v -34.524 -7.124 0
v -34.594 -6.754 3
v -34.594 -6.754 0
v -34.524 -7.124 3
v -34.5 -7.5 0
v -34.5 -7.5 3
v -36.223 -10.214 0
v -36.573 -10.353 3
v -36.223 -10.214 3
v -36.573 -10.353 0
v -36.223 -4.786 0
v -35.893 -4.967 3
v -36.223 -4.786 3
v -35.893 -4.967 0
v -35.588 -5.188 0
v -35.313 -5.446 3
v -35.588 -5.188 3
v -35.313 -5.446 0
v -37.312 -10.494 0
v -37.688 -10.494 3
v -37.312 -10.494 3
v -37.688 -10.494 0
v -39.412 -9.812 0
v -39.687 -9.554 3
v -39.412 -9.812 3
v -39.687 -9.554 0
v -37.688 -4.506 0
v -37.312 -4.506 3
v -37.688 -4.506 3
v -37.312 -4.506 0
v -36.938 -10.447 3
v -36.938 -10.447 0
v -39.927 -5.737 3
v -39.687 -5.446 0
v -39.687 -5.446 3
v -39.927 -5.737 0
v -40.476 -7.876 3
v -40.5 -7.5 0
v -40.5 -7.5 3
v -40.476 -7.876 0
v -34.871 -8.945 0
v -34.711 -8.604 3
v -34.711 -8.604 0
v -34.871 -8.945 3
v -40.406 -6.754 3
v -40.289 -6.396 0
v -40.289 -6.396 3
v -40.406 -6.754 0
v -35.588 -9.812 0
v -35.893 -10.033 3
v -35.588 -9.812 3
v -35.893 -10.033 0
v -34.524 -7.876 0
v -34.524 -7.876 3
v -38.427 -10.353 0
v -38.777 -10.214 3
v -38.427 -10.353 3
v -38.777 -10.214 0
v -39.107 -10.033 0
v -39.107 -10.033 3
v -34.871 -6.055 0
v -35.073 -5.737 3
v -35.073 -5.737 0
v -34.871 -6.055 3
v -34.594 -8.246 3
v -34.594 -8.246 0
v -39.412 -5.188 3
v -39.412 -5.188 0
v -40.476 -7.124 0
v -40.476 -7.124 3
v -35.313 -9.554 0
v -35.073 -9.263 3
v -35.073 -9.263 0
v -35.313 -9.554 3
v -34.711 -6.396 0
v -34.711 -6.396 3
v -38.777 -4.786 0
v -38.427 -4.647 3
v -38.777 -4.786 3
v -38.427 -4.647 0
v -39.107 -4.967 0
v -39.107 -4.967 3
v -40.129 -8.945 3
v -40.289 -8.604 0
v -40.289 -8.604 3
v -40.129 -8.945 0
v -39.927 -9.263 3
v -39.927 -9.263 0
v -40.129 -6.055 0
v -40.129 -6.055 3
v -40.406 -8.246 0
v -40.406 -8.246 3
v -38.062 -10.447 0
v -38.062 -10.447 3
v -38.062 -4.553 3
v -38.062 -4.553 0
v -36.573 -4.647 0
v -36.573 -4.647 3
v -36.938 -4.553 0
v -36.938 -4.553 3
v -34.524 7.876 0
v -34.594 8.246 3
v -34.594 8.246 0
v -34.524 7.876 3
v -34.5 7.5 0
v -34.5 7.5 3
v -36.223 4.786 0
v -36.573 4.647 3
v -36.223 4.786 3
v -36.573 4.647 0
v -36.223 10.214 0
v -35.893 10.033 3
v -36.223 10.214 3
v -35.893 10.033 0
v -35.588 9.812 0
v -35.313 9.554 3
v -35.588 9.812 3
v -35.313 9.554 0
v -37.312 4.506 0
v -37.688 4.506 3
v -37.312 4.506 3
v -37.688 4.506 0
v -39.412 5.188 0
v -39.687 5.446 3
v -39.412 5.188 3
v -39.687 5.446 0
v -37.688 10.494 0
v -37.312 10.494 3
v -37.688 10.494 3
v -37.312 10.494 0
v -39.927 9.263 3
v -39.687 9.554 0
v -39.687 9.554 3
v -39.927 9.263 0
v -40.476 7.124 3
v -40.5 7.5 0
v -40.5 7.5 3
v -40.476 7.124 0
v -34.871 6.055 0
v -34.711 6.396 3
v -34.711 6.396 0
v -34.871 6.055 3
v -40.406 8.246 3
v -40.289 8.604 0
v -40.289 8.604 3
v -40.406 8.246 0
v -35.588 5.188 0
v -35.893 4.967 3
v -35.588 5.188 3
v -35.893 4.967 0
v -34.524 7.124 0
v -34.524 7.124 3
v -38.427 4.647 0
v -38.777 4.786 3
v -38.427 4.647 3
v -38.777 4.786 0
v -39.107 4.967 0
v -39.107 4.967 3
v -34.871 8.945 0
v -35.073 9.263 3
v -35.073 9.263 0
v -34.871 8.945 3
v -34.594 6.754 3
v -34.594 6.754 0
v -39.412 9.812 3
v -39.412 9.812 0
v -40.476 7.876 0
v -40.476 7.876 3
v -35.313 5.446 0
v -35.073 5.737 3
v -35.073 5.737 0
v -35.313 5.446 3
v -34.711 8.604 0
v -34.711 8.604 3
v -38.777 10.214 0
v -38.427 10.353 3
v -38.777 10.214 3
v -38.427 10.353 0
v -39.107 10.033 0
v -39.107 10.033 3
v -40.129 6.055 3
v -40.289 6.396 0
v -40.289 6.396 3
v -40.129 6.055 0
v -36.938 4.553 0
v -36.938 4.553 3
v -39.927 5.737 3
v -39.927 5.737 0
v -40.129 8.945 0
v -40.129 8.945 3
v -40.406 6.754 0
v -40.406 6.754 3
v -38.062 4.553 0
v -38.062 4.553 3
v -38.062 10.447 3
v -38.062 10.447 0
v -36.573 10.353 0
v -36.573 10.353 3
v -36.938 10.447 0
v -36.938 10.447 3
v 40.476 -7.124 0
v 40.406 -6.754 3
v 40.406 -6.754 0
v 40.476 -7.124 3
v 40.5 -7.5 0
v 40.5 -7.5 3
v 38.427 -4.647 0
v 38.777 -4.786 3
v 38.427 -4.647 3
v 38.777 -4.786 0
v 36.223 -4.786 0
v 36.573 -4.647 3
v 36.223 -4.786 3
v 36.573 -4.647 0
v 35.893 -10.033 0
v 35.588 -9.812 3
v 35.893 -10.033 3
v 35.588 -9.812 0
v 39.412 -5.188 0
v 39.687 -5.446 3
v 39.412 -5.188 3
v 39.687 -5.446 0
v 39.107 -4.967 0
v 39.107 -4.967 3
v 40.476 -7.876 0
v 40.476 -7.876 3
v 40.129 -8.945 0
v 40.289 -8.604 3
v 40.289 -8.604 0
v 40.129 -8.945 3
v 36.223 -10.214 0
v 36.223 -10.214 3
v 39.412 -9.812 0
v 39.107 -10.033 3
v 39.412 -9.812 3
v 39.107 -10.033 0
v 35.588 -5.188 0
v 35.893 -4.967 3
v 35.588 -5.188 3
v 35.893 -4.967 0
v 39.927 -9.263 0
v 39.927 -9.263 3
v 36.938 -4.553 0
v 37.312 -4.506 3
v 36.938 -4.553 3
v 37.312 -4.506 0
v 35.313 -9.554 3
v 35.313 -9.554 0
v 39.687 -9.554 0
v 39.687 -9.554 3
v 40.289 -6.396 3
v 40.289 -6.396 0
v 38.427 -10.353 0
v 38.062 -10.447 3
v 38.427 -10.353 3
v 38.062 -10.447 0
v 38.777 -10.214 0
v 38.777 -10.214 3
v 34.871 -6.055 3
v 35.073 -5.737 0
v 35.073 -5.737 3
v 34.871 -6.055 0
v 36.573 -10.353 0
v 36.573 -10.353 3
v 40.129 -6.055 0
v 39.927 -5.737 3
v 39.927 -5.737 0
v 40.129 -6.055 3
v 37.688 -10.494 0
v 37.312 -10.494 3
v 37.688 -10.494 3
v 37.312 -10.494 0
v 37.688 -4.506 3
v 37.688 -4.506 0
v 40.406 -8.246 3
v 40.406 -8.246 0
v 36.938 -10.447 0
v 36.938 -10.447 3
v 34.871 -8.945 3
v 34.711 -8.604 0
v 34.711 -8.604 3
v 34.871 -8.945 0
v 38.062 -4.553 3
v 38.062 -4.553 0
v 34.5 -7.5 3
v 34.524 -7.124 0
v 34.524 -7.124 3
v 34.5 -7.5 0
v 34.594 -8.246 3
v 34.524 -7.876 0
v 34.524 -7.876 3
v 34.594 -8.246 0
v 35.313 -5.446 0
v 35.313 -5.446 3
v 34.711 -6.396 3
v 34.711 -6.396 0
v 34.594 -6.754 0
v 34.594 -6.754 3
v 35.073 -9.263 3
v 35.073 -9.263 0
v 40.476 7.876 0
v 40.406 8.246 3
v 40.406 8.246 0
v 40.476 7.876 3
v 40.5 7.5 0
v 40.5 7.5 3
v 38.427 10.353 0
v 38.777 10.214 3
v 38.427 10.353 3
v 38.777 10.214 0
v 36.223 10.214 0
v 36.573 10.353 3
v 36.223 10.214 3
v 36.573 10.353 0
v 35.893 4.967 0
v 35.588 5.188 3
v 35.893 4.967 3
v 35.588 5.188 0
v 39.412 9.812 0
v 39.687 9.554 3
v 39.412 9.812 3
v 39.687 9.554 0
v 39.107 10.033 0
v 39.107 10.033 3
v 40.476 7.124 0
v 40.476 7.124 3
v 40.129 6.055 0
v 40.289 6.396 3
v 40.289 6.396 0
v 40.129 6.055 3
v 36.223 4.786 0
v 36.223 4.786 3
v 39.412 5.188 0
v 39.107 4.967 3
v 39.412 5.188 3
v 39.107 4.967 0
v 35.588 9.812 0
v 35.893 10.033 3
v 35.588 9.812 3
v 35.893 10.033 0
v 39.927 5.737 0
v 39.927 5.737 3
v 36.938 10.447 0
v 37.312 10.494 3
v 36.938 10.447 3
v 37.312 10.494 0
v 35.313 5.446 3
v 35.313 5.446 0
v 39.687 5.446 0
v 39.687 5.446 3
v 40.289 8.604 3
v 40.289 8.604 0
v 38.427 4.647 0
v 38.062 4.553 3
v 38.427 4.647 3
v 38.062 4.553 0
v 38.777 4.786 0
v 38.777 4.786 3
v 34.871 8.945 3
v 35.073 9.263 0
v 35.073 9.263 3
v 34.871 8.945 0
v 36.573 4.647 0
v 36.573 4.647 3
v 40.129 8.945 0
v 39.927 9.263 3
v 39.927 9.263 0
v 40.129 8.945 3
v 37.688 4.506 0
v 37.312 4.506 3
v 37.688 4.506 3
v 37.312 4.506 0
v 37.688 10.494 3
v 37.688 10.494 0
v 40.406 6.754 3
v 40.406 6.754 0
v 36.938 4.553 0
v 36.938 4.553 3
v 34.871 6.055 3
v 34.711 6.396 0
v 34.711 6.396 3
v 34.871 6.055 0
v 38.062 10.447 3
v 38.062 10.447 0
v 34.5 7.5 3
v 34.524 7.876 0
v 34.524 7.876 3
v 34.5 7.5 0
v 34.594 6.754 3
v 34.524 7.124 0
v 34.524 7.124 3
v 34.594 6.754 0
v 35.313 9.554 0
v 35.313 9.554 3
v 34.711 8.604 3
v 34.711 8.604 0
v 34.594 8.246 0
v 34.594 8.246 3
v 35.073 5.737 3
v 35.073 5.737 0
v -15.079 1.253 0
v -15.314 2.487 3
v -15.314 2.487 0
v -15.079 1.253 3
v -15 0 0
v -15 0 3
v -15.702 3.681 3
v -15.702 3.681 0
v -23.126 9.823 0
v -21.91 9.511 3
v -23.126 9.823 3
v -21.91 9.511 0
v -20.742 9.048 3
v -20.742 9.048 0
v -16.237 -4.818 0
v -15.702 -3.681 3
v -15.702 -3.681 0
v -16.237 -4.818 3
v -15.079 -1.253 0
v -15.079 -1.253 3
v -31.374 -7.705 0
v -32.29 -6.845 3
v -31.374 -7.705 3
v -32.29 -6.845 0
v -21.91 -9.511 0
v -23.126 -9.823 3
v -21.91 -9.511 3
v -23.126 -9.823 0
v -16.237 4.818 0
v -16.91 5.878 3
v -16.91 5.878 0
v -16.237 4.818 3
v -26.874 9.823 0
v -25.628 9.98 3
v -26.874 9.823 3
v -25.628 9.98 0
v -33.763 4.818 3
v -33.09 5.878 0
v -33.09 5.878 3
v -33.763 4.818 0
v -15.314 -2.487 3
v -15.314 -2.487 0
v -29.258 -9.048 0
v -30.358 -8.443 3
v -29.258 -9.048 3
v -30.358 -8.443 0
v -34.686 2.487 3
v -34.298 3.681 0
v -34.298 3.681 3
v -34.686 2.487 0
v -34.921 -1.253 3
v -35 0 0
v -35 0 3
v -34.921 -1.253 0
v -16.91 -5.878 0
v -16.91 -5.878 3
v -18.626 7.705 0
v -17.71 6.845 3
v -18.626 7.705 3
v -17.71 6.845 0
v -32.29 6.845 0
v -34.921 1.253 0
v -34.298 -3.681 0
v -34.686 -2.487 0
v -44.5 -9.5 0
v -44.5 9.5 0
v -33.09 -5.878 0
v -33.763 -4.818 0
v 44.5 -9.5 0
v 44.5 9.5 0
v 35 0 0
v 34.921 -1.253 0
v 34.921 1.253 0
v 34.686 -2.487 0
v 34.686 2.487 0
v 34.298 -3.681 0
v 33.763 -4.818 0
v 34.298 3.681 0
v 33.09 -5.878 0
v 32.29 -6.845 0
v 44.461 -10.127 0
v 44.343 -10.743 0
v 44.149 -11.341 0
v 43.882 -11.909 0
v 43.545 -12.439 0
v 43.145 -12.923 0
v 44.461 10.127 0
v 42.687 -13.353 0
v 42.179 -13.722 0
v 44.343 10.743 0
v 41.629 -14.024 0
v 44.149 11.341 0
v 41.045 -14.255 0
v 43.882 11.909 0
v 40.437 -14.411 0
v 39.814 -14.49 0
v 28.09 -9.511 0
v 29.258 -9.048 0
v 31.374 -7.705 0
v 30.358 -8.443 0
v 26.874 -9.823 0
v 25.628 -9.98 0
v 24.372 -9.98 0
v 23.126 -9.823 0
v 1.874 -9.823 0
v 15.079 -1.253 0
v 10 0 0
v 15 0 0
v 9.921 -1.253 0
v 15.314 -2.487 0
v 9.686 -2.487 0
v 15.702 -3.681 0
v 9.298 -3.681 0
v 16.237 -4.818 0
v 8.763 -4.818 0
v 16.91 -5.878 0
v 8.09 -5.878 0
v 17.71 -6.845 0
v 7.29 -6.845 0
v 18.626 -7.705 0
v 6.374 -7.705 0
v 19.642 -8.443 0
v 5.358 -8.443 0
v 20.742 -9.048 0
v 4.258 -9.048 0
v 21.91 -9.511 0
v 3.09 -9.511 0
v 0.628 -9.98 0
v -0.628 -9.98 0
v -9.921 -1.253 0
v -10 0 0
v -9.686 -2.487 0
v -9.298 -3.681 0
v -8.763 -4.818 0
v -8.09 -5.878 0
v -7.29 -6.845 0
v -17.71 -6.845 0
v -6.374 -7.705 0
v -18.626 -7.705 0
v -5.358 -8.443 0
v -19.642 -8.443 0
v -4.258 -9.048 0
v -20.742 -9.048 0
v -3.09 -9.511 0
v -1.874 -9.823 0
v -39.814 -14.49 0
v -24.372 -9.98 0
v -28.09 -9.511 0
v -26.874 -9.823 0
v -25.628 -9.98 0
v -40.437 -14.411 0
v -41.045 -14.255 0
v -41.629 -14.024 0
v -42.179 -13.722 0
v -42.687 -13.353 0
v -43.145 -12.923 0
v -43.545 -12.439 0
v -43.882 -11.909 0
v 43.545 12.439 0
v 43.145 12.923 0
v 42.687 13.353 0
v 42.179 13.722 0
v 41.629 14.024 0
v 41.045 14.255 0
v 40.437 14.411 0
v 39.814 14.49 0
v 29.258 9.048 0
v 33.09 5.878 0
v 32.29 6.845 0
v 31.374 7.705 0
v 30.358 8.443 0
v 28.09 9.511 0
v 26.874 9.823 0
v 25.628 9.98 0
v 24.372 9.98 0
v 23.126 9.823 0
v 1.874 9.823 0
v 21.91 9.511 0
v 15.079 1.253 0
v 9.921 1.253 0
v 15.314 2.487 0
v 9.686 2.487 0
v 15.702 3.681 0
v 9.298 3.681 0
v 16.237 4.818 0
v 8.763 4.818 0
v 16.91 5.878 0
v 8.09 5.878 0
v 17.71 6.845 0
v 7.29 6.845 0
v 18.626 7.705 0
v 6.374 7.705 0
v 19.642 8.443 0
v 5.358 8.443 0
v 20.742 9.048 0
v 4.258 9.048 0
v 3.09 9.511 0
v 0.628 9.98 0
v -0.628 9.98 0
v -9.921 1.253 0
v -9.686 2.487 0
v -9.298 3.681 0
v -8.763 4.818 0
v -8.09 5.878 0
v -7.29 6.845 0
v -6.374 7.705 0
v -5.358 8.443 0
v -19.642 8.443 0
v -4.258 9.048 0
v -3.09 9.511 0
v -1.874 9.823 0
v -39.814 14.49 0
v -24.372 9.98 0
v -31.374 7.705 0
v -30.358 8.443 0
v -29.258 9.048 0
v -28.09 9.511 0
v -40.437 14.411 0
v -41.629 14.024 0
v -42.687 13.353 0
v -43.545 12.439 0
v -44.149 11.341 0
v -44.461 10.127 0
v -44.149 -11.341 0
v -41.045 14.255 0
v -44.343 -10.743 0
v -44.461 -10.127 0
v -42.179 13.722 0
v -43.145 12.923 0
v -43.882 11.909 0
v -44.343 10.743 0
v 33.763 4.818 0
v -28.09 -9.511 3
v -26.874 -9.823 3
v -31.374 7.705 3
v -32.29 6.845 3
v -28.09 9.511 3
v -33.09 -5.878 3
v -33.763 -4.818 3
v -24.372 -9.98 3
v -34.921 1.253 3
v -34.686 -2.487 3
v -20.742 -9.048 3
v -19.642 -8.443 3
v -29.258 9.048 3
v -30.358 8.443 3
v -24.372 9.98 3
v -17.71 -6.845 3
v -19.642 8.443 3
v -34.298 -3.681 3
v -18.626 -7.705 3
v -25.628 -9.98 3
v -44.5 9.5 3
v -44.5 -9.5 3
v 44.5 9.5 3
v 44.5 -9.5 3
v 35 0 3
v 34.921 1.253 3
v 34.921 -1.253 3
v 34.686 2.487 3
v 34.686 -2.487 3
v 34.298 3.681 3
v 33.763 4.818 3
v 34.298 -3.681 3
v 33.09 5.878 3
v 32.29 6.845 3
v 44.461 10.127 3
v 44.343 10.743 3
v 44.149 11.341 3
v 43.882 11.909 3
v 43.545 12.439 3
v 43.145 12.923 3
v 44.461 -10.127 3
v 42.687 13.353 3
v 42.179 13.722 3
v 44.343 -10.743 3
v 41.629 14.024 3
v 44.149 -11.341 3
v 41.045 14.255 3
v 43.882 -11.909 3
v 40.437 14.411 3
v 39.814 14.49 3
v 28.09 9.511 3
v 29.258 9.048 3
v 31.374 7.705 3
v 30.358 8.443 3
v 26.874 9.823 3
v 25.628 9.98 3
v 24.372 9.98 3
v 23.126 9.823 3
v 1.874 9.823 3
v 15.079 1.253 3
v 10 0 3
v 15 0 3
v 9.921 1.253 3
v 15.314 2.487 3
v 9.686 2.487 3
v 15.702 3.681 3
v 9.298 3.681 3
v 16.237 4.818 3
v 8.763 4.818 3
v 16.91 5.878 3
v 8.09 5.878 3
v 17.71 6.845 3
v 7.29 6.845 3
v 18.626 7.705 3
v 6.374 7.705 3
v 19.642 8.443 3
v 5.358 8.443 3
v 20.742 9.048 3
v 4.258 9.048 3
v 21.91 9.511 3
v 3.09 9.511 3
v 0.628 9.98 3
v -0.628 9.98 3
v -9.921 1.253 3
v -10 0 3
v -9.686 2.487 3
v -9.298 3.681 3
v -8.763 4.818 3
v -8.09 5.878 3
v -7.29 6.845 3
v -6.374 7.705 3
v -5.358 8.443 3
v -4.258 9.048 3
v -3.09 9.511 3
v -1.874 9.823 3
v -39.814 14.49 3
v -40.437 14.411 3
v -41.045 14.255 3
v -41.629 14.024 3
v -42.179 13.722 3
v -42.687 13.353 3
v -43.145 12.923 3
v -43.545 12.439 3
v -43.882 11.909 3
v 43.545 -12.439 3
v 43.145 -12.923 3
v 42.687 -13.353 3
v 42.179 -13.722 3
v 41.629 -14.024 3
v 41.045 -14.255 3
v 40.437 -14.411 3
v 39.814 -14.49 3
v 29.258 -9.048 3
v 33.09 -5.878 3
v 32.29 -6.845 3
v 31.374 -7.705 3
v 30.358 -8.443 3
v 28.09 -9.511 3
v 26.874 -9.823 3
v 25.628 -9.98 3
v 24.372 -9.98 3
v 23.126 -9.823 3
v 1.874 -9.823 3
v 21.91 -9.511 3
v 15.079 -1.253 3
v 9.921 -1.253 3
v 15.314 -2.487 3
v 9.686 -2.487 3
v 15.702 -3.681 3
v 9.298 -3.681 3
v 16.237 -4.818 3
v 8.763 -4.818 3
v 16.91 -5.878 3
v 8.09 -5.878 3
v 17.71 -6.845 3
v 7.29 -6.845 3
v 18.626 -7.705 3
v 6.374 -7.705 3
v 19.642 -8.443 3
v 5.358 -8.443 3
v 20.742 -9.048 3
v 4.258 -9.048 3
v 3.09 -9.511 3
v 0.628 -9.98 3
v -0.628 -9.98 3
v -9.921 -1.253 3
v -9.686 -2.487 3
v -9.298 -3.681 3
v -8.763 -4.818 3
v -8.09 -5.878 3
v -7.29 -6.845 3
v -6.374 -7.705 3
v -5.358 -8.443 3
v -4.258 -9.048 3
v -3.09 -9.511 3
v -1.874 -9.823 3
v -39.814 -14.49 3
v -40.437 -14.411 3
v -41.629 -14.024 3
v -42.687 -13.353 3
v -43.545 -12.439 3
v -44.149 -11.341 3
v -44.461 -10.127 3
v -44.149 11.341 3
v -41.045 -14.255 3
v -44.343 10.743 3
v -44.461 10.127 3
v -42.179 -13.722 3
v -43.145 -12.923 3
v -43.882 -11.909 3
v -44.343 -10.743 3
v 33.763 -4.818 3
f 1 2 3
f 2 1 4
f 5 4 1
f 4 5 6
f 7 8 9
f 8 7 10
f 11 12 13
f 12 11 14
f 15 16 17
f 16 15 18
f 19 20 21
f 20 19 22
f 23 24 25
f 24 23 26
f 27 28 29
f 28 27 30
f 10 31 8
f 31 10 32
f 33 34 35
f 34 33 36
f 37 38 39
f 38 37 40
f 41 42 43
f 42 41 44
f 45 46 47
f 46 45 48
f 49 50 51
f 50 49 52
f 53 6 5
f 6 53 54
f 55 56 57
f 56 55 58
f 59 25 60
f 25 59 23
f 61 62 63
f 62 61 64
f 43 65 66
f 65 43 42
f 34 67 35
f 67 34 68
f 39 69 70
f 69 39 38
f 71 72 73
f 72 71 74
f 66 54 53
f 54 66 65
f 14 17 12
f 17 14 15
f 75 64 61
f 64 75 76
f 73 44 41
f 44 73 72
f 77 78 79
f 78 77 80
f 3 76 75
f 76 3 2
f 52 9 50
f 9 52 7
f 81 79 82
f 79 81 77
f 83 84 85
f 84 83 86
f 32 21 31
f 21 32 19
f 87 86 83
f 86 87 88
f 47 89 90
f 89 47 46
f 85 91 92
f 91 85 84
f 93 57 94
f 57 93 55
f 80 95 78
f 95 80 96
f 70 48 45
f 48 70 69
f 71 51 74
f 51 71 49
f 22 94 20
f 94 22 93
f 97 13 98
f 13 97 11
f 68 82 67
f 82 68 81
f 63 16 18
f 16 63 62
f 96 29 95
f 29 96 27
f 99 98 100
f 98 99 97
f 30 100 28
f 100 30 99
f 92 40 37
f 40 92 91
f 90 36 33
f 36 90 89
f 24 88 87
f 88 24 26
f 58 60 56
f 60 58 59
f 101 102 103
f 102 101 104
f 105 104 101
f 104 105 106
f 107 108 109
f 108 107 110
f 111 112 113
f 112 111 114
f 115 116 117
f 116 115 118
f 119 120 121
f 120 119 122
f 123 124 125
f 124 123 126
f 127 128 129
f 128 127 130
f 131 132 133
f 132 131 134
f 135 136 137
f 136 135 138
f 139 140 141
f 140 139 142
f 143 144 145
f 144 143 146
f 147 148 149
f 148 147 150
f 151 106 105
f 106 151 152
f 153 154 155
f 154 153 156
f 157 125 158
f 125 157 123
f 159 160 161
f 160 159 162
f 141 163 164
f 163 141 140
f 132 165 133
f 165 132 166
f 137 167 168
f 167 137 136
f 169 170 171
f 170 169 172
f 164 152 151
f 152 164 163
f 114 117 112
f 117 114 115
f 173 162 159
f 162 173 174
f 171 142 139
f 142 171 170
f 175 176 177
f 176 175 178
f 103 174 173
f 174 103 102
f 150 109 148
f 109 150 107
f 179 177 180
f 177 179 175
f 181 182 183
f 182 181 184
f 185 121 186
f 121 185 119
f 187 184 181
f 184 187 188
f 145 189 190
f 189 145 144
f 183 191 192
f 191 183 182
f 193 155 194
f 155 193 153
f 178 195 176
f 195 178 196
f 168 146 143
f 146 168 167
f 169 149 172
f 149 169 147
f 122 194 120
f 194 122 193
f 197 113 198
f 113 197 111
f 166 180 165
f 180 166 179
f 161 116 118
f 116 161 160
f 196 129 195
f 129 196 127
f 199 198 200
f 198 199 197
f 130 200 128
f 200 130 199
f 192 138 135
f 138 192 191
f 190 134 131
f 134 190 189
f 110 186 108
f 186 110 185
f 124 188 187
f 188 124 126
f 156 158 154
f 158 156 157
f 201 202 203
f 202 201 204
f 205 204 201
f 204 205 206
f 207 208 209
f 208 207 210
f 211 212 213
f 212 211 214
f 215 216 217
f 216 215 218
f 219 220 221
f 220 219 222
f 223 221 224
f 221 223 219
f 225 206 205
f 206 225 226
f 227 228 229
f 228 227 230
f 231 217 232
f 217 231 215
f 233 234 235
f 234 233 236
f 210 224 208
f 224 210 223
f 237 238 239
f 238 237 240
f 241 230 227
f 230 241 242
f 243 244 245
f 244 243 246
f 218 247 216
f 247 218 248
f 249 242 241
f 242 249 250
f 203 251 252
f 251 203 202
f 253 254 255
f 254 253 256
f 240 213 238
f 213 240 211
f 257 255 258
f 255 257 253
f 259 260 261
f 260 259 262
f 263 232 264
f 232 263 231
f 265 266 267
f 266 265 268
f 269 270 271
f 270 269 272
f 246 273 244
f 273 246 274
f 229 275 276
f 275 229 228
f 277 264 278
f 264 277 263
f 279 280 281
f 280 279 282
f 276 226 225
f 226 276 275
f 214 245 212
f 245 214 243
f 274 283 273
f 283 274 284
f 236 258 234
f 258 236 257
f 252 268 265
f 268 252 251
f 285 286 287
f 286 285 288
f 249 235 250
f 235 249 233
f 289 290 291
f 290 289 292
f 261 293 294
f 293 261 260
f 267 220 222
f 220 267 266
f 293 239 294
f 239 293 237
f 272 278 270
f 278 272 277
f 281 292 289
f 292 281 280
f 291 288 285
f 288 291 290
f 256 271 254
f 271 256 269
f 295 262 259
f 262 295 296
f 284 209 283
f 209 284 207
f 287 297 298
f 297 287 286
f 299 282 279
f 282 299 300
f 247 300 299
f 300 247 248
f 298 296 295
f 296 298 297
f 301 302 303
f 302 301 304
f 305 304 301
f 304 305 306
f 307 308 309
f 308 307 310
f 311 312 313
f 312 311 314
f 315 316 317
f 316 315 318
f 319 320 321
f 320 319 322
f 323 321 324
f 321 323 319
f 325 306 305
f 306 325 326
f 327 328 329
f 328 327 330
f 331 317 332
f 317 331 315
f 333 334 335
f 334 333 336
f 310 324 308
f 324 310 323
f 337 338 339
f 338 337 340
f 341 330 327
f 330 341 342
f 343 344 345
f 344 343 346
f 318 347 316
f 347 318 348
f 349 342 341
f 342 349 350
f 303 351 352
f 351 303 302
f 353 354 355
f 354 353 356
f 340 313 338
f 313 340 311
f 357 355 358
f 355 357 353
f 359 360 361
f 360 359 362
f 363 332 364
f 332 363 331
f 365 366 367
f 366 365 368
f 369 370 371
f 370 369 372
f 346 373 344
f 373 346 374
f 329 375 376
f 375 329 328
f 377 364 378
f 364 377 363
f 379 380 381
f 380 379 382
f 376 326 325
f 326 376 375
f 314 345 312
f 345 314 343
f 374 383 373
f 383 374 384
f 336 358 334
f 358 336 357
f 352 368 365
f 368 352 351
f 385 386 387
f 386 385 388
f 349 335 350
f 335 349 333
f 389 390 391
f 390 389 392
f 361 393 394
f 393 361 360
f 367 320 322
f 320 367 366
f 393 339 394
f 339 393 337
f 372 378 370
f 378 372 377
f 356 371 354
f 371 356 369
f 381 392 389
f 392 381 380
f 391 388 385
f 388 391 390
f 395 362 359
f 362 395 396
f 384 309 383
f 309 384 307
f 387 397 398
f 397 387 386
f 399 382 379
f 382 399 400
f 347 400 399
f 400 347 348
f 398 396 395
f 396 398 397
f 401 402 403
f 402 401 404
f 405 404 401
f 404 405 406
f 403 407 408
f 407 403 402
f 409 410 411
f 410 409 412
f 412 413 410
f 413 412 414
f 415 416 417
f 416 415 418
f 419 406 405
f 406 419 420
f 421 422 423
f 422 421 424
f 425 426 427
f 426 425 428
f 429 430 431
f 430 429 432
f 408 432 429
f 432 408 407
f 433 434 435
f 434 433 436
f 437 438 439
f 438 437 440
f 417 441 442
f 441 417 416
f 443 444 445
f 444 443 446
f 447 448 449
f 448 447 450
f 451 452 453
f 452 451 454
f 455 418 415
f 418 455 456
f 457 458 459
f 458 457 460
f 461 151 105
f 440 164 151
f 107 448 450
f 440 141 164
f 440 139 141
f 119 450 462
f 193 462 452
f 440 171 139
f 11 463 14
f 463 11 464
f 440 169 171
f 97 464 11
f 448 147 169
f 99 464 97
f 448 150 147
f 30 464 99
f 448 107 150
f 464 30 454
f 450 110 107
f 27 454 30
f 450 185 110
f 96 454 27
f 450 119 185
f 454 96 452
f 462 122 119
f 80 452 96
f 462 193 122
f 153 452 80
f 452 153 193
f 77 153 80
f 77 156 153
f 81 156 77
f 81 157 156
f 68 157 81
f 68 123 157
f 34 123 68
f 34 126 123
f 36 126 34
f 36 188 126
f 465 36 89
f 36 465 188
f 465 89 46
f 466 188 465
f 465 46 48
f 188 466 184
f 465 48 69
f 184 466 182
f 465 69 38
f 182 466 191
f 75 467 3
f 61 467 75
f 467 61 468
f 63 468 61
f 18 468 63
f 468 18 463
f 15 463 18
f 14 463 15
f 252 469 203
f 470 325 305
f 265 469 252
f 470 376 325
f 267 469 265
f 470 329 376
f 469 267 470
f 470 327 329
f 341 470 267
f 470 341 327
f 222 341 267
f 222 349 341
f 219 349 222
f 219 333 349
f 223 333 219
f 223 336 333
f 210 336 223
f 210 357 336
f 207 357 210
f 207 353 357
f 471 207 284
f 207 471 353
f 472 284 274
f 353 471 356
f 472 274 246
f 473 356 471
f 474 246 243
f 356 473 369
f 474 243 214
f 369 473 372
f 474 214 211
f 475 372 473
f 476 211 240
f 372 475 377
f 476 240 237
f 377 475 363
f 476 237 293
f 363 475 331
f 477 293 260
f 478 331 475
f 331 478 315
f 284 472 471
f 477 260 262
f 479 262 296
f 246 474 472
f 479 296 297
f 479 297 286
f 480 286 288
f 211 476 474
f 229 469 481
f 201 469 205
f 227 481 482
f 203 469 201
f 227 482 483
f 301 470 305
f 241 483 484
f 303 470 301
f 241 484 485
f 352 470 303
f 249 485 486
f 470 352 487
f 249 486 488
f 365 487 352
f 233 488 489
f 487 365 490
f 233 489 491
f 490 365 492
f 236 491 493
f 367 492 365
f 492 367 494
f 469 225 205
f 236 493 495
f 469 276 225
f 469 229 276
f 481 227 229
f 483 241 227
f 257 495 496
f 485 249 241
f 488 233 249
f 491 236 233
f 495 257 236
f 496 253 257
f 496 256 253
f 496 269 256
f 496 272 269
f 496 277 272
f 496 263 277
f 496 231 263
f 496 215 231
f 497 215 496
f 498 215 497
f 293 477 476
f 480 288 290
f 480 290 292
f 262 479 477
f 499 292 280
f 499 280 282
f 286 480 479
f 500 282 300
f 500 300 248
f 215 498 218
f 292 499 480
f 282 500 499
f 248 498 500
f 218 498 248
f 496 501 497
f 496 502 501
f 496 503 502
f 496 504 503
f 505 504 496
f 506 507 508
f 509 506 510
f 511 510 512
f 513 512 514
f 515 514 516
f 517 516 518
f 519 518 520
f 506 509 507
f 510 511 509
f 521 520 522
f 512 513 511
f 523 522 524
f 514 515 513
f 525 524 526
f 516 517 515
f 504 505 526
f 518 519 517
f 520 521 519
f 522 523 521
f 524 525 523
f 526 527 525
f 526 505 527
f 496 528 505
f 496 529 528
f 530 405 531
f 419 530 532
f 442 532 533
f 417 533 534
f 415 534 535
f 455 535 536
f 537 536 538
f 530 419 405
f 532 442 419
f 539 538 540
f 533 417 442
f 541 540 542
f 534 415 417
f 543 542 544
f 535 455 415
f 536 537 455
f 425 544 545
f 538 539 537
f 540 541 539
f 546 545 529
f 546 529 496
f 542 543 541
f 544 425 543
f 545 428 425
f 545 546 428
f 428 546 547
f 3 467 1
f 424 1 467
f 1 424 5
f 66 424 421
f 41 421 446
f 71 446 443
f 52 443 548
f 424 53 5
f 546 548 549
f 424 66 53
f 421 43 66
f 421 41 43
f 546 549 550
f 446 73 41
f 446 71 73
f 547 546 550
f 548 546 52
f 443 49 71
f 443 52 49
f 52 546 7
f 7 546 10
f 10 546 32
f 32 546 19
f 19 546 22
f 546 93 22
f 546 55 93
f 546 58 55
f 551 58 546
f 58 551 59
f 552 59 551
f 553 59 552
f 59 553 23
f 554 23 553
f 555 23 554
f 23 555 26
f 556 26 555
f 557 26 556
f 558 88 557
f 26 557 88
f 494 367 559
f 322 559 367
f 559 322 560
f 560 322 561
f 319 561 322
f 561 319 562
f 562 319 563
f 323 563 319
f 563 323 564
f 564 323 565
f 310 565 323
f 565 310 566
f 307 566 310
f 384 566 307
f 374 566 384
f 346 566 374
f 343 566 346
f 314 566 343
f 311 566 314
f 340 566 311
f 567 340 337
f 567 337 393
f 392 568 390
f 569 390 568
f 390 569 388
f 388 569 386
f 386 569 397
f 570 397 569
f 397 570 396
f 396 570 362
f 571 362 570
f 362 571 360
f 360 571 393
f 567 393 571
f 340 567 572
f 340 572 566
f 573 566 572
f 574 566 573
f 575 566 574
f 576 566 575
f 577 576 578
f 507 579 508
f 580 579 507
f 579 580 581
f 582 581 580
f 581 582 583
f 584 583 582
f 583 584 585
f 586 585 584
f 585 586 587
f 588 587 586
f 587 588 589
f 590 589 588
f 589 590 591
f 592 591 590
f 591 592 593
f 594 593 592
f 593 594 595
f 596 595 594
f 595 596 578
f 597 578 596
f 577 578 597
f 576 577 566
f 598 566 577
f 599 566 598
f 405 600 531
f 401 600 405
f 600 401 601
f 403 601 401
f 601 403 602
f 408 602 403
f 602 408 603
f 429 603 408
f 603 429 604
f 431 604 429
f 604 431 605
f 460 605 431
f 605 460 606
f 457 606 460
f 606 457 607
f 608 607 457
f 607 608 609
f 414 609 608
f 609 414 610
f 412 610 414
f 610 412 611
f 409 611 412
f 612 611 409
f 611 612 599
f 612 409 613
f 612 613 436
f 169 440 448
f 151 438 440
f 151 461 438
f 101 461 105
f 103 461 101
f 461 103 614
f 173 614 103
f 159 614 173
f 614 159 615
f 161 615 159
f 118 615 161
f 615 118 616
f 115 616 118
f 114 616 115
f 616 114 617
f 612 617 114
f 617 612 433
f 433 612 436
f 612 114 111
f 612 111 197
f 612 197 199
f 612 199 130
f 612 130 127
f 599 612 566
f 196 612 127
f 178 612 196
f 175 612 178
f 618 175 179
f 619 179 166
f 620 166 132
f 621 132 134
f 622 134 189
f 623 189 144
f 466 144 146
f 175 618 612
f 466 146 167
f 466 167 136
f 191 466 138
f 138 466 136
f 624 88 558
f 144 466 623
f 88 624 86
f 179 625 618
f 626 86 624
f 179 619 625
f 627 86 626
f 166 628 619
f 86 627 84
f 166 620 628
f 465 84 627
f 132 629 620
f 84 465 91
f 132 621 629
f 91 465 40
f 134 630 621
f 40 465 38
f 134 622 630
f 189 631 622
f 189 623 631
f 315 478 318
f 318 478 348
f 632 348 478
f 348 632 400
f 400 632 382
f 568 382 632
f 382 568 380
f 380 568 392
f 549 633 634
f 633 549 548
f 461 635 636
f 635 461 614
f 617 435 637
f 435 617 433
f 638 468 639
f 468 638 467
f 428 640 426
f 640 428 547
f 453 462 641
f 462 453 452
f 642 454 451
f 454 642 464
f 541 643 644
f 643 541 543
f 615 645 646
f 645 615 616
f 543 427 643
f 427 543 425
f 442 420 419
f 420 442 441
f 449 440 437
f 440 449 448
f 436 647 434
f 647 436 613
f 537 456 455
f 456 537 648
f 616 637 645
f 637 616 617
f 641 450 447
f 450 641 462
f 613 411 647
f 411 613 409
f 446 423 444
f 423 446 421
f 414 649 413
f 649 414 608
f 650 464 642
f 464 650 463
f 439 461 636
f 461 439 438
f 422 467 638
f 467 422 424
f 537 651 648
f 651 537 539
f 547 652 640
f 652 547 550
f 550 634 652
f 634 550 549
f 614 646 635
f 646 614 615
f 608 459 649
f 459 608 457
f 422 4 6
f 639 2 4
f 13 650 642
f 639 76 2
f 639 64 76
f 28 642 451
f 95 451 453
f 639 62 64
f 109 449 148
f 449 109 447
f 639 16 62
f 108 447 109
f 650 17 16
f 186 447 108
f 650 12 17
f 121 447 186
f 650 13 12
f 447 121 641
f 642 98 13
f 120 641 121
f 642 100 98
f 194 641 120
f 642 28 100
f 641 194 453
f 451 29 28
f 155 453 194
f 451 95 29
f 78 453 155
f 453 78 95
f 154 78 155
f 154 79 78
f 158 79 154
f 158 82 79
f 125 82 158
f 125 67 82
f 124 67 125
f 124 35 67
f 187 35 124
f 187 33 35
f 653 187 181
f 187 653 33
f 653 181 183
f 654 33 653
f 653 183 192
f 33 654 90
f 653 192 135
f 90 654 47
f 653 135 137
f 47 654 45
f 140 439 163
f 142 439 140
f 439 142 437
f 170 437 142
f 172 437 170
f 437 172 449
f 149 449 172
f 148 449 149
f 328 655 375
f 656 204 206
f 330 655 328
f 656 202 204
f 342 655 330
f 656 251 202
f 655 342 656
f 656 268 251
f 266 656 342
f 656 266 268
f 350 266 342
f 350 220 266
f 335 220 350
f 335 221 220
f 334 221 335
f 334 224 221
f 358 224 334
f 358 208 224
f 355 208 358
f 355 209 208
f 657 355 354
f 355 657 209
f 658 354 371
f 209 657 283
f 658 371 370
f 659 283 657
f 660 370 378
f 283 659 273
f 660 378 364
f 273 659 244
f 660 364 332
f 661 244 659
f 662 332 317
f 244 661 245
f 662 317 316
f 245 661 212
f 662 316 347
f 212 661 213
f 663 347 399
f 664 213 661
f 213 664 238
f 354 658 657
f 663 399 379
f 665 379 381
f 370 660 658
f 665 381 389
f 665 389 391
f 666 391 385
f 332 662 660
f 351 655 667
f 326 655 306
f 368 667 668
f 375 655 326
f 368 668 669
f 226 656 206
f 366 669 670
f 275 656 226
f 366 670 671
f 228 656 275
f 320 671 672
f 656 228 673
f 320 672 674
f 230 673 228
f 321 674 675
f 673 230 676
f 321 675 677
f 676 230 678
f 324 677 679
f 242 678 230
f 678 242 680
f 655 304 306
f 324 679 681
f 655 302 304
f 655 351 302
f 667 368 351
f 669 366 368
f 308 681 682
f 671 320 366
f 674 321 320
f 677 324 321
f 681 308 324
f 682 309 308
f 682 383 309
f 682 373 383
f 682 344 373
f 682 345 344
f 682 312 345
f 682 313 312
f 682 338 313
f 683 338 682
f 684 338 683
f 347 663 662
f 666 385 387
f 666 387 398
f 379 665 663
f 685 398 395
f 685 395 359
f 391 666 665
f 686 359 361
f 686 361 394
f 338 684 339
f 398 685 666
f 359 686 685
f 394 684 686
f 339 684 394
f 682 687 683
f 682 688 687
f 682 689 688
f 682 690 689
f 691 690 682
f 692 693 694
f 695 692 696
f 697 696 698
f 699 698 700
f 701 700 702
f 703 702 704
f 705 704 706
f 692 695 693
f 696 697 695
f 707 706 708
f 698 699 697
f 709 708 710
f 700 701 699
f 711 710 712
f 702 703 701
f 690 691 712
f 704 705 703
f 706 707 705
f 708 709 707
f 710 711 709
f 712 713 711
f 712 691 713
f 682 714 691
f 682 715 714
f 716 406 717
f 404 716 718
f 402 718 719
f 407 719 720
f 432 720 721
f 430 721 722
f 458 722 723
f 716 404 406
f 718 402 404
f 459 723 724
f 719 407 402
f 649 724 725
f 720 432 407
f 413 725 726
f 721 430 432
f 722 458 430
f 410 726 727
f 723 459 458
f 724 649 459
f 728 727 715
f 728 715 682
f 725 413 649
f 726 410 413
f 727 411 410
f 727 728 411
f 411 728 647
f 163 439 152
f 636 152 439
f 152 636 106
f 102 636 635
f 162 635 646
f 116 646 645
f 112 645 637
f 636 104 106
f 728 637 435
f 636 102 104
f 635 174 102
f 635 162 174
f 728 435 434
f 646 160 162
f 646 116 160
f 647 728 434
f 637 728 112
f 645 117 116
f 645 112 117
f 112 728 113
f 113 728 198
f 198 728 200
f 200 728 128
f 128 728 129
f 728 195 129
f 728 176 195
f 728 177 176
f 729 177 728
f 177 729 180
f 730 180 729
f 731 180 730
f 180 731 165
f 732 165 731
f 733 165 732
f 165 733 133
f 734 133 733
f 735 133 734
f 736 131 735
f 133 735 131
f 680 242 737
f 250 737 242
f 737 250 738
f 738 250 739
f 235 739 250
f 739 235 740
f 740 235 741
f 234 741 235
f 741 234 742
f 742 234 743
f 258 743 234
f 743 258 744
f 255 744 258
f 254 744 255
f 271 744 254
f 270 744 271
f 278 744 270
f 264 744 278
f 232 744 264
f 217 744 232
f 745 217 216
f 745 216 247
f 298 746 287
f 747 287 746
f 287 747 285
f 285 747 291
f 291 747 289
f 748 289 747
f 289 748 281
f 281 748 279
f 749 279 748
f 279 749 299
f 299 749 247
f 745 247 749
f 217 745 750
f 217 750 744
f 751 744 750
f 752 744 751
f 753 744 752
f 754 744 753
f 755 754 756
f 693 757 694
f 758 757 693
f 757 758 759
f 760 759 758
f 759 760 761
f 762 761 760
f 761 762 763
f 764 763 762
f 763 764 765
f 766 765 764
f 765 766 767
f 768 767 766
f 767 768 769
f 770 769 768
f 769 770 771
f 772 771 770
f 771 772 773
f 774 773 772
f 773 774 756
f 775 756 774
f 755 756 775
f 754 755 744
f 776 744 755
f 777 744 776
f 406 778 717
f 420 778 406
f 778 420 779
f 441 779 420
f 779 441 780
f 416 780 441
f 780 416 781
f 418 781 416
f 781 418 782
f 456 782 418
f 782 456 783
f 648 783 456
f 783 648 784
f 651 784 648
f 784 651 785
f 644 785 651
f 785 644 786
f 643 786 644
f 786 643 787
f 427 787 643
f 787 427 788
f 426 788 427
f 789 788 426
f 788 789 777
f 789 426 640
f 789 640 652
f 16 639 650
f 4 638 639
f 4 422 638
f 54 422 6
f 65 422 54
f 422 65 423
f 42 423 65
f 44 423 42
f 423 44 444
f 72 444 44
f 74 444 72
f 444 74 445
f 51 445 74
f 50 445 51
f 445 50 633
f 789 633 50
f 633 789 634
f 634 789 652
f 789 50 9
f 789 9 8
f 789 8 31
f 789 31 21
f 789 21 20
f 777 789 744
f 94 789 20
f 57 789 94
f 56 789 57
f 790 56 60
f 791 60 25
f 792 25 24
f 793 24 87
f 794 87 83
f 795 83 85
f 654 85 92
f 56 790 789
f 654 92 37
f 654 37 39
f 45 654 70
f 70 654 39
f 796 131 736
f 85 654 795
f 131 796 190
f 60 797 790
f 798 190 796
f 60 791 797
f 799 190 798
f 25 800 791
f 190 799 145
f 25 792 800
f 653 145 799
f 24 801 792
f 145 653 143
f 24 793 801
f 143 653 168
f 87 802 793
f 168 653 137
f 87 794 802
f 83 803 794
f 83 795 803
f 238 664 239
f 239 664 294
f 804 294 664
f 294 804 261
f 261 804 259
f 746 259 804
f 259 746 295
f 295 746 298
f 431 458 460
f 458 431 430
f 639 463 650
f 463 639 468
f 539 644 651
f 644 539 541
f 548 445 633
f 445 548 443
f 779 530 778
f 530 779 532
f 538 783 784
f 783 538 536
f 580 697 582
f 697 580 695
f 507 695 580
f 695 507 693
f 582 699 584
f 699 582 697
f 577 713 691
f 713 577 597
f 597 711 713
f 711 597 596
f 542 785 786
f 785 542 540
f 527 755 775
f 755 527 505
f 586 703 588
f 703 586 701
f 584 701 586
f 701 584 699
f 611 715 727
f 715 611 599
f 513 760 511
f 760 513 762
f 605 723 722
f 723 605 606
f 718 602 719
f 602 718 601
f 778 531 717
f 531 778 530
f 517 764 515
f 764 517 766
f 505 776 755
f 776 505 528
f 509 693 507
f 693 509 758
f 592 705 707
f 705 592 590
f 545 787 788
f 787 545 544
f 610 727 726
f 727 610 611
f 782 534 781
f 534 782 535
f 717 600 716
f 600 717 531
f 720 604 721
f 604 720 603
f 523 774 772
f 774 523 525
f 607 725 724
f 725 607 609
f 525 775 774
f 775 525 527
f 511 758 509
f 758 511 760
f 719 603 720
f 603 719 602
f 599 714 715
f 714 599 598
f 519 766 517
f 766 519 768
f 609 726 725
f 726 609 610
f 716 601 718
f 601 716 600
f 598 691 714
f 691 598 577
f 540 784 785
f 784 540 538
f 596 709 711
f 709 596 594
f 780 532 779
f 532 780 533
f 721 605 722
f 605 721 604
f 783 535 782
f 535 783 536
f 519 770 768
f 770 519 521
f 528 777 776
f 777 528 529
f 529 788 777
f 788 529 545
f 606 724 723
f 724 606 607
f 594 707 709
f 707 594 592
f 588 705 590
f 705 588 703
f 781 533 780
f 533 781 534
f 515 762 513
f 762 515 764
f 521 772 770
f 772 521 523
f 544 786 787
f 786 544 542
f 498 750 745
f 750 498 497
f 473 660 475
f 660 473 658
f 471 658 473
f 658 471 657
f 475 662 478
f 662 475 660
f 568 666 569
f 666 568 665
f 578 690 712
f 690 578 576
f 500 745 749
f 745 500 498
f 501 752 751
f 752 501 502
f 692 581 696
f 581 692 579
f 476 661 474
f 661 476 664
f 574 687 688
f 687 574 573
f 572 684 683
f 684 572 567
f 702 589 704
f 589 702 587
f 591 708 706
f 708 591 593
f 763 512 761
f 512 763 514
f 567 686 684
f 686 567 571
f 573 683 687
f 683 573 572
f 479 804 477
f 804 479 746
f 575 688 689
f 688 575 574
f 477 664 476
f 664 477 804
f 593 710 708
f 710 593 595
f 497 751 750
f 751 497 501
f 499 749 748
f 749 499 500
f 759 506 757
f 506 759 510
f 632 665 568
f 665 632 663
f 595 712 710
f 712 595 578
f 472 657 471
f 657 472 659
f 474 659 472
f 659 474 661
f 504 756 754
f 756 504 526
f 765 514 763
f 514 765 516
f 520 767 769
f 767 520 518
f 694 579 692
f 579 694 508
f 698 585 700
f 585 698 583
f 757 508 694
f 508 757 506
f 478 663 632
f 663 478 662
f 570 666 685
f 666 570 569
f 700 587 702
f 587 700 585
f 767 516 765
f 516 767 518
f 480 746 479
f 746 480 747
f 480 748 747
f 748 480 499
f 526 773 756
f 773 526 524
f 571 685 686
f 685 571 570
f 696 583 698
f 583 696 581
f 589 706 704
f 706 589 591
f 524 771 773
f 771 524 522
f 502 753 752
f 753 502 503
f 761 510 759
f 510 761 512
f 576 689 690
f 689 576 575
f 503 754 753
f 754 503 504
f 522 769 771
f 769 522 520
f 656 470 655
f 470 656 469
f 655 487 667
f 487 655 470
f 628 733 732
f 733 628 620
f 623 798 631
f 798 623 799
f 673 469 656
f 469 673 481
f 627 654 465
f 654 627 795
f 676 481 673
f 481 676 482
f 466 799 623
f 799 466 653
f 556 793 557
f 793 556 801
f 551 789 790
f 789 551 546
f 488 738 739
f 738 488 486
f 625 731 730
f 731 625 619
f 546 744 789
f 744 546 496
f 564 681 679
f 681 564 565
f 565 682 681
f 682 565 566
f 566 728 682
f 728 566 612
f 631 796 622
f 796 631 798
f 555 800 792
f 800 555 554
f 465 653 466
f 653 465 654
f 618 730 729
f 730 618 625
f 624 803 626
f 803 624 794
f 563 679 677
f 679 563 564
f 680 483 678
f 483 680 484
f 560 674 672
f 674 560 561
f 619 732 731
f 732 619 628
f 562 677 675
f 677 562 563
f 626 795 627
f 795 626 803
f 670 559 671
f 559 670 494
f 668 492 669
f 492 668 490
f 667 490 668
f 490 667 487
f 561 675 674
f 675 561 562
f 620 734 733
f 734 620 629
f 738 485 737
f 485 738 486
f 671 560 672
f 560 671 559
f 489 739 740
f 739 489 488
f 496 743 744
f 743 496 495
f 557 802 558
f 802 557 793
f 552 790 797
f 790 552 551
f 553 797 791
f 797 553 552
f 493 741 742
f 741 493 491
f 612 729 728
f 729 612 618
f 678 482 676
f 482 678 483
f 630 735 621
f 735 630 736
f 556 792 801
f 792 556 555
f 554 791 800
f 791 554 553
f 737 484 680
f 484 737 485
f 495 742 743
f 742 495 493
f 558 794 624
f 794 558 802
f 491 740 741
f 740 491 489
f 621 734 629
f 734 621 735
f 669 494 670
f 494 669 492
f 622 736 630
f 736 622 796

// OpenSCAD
$fn = 50;


difference() {
	union() {
		hull() {
			translate(v = [-39.5000000000, 9.5000000000, 0]) {
				cylinder(h = 3, r = 5);
			}
			translate(v = [39.5000000000, 9.5000000000, 0]) {
				cylinder(h = 3, r = 5);
			}
			translate(v = [-39.5000000000, -9.5000000000, 0]) {
				cylinder(h = 3, r = 5);
			}
			translate(v = [39.5000000000, -9.5000000000, 0]) {
				cylinder(h = 3, r = 5);
			}
		}
	}
	union() {
		#translate(v = [-37.5000000000, -7.5000000000, -100.0000000000]) {
			cylinder(h = 200, r = 3.0000000000);
		}
		#translate(v = [-37.5000000000, 7.5000000000, -100.0000000000]) {
			cylinder(h = 200, r = 3.0000000000);
		}
		#translate(v = [37.5000000000, -7.5000000000, -100.0000000000]) {
			cylinder(h = 200, r = 3.0000000000);
		}
		#translate(v = [37.5000000000, 7.5000000000, -100.0000000000]) {
			cylinder(h = 200, r = 3.0000000000);
		}
		#translate(v = [-25.0000000000, 0, 0]) {
			cylinder(h = 3, r = 10.0000000000);
		}
		#cylinder(h = 3, r = 10.0000000000);
		#translate(v = [25.0000000000, 0, 0]) {
			cylinder(h = 3, r = 10.0000000000);
		}
	}
}
